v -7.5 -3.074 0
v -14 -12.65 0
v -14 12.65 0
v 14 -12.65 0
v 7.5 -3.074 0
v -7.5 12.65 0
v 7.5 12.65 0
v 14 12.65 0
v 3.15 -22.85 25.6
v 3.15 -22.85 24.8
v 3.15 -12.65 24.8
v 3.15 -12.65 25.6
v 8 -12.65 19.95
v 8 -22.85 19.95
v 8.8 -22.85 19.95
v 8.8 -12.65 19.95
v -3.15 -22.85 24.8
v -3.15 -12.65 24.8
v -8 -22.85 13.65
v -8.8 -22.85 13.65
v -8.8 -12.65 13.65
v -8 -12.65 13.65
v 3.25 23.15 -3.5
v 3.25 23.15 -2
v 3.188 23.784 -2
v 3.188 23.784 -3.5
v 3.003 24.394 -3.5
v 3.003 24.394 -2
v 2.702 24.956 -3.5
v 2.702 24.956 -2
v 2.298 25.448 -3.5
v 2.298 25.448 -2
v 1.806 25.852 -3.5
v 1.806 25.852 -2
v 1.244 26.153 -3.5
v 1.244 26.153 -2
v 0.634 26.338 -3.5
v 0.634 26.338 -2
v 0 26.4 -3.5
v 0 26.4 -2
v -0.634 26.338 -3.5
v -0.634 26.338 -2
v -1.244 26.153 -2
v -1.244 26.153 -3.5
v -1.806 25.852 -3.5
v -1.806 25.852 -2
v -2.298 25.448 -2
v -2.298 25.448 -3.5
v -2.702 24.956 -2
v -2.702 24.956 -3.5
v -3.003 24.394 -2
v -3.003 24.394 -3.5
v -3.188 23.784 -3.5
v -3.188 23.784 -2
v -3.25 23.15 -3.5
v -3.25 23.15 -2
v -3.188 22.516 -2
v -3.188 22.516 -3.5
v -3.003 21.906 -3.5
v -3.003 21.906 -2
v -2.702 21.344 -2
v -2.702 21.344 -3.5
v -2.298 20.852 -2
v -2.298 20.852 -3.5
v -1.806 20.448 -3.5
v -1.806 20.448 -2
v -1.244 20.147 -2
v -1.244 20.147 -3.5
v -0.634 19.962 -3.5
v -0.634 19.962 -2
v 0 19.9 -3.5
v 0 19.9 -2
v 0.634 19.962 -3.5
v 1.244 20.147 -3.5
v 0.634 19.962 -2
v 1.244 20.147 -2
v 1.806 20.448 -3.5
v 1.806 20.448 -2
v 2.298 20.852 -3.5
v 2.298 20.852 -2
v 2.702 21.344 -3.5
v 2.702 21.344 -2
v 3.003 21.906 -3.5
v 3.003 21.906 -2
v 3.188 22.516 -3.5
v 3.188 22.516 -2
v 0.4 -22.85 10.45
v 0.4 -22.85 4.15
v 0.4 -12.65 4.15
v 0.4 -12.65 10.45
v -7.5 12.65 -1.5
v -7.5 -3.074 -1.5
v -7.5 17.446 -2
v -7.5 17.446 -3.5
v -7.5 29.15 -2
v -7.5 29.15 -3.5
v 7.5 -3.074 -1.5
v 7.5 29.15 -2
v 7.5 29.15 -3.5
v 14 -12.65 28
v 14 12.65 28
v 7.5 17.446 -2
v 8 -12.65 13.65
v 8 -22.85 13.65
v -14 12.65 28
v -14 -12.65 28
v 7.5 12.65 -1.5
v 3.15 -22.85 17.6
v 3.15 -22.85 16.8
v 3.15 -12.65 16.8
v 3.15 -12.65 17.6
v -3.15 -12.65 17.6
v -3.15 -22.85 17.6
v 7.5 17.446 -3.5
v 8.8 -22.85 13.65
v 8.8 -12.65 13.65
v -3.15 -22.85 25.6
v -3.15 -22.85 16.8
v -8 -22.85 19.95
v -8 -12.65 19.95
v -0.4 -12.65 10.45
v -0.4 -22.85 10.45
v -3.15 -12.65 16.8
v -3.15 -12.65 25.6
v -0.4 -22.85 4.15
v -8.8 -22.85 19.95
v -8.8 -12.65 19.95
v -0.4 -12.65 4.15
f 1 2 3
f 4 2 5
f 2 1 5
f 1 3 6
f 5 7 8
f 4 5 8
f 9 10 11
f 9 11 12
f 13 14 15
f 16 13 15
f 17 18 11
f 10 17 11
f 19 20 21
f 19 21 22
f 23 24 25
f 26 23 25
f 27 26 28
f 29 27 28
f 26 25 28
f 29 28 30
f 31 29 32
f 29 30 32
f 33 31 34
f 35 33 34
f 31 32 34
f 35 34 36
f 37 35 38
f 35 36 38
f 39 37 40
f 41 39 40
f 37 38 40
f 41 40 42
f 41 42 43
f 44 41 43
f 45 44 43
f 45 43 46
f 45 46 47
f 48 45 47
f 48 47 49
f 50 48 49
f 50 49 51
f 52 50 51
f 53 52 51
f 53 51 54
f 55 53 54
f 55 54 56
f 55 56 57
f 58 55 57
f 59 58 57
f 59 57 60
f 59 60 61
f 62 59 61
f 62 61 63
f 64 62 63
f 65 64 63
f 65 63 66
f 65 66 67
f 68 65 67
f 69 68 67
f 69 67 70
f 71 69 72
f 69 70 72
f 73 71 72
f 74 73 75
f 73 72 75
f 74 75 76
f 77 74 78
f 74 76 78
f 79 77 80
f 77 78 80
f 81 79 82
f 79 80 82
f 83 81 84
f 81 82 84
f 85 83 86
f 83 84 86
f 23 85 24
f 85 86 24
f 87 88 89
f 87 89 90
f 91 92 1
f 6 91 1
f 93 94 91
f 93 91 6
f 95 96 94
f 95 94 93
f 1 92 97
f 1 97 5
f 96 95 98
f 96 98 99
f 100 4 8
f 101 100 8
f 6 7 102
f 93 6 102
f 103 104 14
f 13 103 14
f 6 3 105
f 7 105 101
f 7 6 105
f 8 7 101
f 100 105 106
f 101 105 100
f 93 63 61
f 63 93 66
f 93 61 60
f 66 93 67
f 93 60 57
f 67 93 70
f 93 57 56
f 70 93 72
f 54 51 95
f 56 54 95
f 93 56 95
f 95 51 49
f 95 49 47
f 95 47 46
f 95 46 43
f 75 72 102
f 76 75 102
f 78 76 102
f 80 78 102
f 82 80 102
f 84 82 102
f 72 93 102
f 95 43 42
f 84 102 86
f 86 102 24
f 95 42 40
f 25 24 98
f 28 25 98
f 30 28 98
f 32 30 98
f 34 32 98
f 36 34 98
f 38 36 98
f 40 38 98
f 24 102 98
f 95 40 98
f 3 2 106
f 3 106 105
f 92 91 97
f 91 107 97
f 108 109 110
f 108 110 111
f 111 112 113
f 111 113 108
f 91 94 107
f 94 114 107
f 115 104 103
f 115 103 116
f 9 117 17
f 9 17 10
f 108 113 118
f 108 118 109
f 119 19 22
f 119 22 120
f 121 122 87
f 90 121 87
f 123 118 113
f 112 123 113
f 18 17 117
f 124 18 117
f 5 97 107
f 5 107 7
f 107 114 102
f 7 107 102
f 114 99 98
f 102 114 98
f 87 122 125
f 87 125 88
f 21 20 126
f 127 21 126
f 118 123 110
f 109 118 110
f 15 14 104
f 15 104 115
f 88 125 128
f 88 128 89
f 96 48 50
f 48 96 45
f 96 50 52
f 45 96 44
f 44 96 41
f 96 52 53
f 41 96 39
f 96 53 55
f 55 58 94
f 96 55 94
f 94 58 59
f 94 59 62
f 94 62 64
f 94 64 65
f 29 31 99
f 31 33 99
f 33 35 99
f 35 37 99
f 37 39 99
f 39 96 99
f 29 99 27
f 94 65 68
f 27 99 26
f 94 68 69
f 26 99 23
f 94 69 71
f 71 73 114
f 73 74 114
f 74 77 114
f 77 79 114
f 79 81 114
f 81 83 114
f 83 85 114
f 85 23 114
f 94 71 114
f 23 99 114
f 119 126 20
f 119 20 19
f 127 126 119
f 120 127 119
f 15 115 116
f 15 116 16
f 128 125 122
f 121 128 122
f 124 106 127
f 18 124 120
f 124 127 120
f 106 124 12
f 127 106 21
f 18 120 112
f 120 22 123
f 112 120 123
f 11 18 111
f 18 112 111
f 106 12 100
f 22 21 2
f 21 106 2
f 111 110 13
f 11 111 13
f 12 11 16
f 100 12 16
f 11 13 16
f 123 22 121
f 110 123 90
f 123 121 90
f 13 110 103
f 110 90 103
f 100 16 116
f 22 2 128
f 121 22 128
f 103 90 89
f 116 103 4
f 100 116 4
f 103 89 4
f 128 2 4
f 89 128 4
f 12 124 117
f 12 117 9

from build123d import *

# Parameters (mm, degrees)
ESQUISSE1_W             = 28
ESQUISSE1_H             = 25.3
BOSS_EXTRU_1_DEPTH      = 28
BOSS_EXTRU_2_DEPTH      = 7.5
ESQUISSE3_R             = 3.25
ENL_V_MAT_EXTRU_1_DEPTH = 45.110344592
ESQUISSE4_W             = 0.8
ESQUISSE4_H             = 6.3
ESQUISSE4_W_2           = 6.3
ESQUISSE4_H_2           = 0.8
BOSS_EXTRU_3_DEPTH      = 10.2


with BuildPart() as part:
    # Esquisse1 → Boss.-Extru.1 (new body)
    with BuildSketch(Plane.XY):
        Rectangle(ESQUISSE1_W, ESQUISSE1_H)
    extrude(amount=BOSS_EXTRU_1_DEPTH)

    # Esquisse2 → Boss.-Extru.2 (add, symmetric)
    with BuildSketch(Plane(origin=(0, 0, 0), x_dir=(0, 0, -1), z_dir=(1, 0, 0))):
        Polygon((0, 12.65), (2, 17.44649219), (2, 29.15), (3.5, 29.15), (3.5, 17.44649219), (1.5, 12.65), (1.5, -3.073931528), (0, -3.073931528), align=None)
    extrude(amount=BOSS_EXTRU_2_DEPTH, both=True)

    # Esquisse3 → Enlèv. mat.-Extru.1 (cut, through all)
    with BuildSketch(Plane.XY.offset(-2)):
        with Locations((0, 23.15)):
            Circle(ESQUISSE3_R)
    extrude(amount=-ENL_V_MAT_EXTRU_1_DEPTH, mode=Mode.SUBTRACT)

    # Esquisse4 → Boss.-Extru.3 (add)
    with BuildSketch(Plane.XZ.offset(12.65)):
        with Locations((8.4, 16.8)):
            Rectangle(ESQUISSE4_W, ESQUISSE4_H)
        with Locations((0, 7.3)):
            Rectangle(ESQUISSE4_W, ESQUISSE4_H)
        with Locations((0, 25.2)):
            Rectangle(ESQUISSE4_W_2, ESQUISSE4_H_2)
        with Locations((-8.4, 16.8)):
            Rectangle(ESQUISSE4_W, ESQUISSE4_H)
        with Locations((0, 17.2)):
            Rectangle(ESQUISSE4_W_2, ESQUISSE4_H_2)
    extrude(amount=BOSS_EXTRU_3_DEPTH)


solid = part.part
